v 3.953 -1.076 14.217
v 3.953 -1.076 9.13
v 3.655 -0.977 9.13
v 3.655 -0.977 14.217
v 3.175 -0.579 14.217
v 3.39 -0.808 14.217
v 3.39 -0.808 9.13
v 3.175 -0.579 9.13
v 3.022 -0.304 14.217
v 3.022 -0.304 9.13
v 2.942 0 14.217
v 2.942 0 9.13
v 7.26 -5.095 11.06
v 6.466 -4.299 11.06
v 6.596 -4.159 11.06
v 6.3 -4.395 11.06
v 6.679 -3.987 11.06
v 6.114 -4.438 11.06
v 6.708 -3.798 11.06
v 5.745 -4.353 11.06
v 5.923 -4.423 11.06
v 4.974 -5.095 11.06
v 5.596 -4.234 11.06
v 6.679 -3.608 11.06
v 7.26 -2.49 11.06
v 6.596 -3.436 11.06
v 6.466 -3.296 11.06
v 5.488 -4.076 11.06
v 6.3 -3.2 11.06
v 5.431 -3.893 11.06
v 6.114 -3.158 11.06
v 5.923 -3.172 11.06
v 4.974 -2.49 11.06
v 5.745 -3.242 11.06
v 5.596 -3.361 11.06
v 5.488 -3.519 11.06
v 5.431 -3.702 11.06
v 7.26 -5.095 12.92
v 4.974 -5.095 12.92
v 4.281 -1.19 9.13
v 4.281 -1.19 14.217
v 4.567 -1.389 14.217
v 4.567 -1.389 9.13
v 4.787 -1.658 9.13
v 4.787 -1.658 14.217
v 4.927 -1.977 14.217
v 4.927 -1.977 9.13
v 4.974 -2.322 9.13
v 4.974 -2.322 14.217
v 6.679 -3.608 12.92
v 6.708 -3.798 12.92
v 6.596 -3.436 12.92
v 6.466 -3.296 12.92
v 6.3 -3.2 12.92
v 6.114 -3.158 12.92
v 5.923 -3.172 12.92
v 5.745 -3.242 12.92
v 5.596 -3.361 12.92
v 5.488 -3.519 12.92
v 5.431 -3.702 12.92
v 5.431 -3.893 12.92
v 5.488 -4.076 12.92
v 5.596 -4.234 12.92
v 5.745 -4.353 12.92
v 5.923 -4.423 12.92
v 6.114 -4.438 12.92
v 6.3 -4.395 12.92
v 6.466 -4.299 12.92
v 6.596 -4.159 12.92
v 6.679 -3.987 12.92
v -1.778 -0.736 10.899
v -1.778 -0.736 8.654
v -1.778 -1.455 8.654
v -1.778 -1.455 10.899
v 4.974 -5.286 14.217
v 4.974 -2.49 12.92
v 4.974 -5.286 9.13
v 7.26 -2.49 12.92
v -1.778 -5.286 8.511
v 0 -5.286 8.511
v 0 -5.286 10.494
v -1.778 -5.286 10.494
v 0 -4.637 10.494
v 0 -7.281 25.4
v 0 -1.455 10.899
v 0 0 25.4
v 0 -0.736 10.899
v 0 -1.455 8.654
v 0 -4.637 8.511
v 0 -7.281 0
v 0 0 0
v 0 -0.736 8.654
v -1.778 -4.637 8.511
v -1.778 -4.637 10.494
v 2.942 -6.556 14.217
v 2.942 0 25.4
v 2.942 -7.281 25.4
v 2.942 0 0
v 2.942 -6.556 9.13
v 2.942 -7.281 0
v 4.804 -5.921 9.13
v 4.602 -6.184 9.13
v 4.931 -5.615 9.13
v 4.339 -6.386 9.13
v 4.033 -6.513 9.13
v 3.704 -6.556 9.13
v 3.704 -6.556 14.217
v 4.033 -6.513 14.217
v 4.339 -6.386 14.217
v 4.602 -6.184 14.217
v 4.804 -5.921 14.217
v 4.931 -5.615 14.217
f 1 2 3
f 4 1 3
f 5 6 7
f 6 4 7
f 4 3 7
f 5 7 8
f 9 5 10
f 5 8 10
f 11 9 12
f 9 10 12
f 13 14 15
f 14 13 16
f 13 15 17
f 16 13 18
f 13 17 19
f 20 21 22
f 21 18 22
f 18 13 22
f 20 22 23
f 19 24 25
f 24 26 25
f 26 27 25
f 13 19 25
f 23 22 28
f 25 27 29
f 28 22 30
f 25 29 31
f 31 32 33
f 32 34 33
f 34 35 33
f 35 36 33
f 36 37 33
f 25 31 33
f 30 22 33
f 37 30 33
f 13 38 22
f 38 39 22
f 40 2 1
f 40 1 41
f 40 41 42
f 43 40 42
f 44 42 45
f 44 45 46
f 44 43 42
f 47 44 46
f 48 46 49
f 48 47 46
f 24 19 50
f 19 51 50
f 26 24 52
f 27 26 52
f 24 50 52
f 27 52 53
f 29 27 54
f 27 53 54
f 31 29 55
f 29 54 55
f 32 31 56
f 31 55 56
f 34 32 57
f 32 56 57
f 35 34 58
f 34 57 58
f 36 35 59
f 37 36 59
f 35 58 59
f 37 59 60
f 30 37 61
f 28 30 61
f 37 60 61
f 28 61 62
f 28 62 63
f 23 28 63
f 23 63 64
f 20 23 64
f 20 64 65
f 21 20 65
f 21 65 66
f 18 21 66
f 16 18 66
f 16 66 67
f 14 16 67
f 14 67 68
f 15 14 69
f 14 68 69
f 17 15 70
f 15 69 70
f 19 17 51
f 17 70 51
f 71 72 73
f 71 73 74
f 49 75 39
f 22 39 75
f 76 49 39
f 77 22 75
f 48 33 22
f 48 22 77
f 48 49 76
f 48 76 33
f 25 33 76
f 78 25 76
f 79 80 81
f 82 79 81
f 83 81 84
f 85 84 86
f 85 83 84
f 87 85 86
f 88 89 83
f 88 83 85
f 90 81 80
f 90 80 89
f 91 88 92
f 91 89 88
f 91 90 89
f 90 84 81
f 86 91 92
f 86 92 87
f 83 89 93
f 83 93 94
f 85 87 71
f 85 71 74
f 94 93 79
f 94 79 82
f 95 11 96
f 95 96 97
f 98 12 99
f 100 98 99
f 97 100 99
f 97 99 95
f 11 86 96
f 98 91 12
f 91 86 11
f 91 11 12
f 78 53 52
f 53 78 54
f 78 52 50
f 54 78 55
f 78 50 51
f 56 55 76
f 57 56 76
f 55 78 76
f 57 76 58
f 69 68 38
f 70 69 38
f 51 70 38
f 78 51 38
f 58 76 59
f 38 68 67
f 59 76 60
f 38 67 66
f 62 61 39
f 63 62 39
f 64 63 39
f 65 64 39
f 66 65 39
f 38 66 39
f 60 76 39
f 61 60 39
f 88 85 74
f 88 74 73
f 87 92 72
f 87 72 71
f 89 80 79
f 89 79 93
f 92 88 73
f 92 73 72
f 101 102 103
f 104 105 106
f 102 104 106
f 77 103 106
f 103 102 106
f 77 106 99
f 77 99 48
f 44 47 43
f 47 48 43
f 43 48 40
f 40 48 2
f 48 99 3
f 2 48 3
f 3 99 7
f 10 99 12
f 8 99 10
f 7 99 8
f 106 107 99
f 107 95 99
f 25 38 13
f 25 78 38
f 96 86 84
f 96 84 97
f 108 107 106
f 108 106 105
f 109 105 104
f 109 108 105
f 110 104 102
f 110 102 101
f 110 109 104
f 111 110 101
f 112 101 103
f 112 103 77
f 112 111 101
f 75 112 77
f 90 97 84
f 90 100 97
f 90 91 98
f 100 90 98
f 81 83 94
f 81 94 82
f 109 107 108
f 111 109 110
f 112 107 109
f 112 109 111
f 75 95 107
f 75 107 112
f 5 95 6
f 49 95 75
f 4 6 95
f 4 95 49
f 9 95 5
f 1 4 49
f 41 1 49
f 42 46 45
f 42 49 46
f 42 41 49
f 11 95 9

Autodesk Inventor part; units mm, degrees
ref_plane "YZ Plane" through (0, 0, 0) normal (1, 0, 0) x (0, 1, 0)
ref_plane "XZ Plane" through (0, 0, 0) normal (0, 1, 0) x (-1, 0, 0)
ref_plane "XY Plane" through (0, 0, 0) normal (0, 0, 1) x (1, 0, 0)
sketch "Sketch1" plane through (0, 0, 0) normal (0, 0, 1) x (1, 0, 0)
  line L0 (0, 0) -> (2.9424, 0)
  line L1 (2.9424, 0) -> (2.9424, -7.2806)
  line L2 (2.9424, -7.2806) -> (0, -7.2806)
  line L3 (0, -7.2806) -> (0, 0)
extrude "Extrusion1" add sketch "Sketch1" along normal blind 25.4
sketch "Sketch2" plane through (2.9424, -7.2806, 0) normal (1, 0, 0) x (0, 0, -1)
  point P0 (0, 7.2806)
sketch "Sketch3" plane through (2.9424, -7.2806, 0) normal (1, 0, 0) x (0, 0, -1)
  line L0 (-9.1297, 6.2288) -> (-14.2174, 6.2288)
  line L1 (-14.2174, 6.2288) -> (-14.2174, 0.7246)
  line L2 (-14.2174, 0.7246) -> (-9.1297, 0.7246)
  line L3 (-9.1297, 0.7246) -> (-9.1297, 6.2288)
  point P0 (0, 7.2806)
extrude "Extrusion2" add sketch "Sketch3" along normal blind 2.032
fillet "Fillet1" radius 1.27 3 edges at (4.9744, -1.0519, 11.6735) (4.9744, -6.556, 11.6735) (2.9424, -1.0519, 11.6735)
sketch "Sketch4" plane through (4.9744, -7.2806, 0) normal (1, 0, 0) x (0, 0, -1)
  line L0 (-12.9198, 2.186) -> (-11.0597, 2.186)
  line L1 (-11.0597, 2.186) -> (-11.0597, 4.7902)
  line L2 (-11.0597, 4.7902) -> (-12.9198, 4.7902)
  line L3 (-12.9198, 4.7902) -> (-12.9198, 2.186)
  point P0 (0, 7.2806)
extrude "Extrusion3" add sketch "Sketch4" along normal blind 2.286
sketch "Sketch5" plane through (4.9744, -7.2806, 0) normal (1, 0, 0) x (0, 0, -1)
  point P0 (0, 7.2806)
sketch "Sketch6" plane through (7.2604, -3.8837, 11.7408) normal (1, 0, 0) x (0, 0, -1)
  point P0 (11.7408, 3.8837)
sketch "Sketch7" plane through (4.9744, -5.0946, 12.9198) normal (0, 0, 1) x (1, 0, 0)
  circle A0 centre (1.0916, 1.297) radius 0.6417
  point P0 (-4.9744, 5.0946)
extrude "Extrusion4" cut sketch "Sketch7" against normal blind 25.4
sketch "Sketch8" plane through (0, -7.2806, 0) normal (0, -1, 0) x (1, 0, 0)
  point P0 (0, 0)
sketch "Sketch9" plane through (0, -7.2806, 0) normal (-1, 0, 0) x (0, 0, 1)
  line L0 (8.6535, 6.5442) -> (10.8988, 6.5442)
  line L1 (10.8988, 6.5442) -> (10.8988, 5.8257)
  line L2 (10.8988, 5.8257) -> (8.6535, 5.8257)
  line L3 (8.6535, 5.8257) -> (8.6535, 6.5442)
  point P0 (0, 7.2806)
extrude "Extrusion5" add sketch "Sketch9" along normal blind 1.778
sketch "Sketch10" plane through (0, -7.2806, 0) normal (-1, 0, 0) x (0, 0, 1)
  line L0 (9.1297, 1.9946) -> (14.2174, 1.9946) projected
  line L1 (8.5112, 2.6437) -> (10.4941, 2.6437)
  line L2 (10.4941, 2.6437) -> (10.4941, 1.9946)
  line L3 (10.4941, 1.9946) -> (8.5112, 1.9946)
  line L4 (8.5112, 1.9946) -> (8.5112, 2.6437)
  point P0 (0, 7.2806)
extrude "Extrusion6" add sketch "Sketch10" along normal blind 1.778
properties part number "pen holder" material "Wood (Oak)"
